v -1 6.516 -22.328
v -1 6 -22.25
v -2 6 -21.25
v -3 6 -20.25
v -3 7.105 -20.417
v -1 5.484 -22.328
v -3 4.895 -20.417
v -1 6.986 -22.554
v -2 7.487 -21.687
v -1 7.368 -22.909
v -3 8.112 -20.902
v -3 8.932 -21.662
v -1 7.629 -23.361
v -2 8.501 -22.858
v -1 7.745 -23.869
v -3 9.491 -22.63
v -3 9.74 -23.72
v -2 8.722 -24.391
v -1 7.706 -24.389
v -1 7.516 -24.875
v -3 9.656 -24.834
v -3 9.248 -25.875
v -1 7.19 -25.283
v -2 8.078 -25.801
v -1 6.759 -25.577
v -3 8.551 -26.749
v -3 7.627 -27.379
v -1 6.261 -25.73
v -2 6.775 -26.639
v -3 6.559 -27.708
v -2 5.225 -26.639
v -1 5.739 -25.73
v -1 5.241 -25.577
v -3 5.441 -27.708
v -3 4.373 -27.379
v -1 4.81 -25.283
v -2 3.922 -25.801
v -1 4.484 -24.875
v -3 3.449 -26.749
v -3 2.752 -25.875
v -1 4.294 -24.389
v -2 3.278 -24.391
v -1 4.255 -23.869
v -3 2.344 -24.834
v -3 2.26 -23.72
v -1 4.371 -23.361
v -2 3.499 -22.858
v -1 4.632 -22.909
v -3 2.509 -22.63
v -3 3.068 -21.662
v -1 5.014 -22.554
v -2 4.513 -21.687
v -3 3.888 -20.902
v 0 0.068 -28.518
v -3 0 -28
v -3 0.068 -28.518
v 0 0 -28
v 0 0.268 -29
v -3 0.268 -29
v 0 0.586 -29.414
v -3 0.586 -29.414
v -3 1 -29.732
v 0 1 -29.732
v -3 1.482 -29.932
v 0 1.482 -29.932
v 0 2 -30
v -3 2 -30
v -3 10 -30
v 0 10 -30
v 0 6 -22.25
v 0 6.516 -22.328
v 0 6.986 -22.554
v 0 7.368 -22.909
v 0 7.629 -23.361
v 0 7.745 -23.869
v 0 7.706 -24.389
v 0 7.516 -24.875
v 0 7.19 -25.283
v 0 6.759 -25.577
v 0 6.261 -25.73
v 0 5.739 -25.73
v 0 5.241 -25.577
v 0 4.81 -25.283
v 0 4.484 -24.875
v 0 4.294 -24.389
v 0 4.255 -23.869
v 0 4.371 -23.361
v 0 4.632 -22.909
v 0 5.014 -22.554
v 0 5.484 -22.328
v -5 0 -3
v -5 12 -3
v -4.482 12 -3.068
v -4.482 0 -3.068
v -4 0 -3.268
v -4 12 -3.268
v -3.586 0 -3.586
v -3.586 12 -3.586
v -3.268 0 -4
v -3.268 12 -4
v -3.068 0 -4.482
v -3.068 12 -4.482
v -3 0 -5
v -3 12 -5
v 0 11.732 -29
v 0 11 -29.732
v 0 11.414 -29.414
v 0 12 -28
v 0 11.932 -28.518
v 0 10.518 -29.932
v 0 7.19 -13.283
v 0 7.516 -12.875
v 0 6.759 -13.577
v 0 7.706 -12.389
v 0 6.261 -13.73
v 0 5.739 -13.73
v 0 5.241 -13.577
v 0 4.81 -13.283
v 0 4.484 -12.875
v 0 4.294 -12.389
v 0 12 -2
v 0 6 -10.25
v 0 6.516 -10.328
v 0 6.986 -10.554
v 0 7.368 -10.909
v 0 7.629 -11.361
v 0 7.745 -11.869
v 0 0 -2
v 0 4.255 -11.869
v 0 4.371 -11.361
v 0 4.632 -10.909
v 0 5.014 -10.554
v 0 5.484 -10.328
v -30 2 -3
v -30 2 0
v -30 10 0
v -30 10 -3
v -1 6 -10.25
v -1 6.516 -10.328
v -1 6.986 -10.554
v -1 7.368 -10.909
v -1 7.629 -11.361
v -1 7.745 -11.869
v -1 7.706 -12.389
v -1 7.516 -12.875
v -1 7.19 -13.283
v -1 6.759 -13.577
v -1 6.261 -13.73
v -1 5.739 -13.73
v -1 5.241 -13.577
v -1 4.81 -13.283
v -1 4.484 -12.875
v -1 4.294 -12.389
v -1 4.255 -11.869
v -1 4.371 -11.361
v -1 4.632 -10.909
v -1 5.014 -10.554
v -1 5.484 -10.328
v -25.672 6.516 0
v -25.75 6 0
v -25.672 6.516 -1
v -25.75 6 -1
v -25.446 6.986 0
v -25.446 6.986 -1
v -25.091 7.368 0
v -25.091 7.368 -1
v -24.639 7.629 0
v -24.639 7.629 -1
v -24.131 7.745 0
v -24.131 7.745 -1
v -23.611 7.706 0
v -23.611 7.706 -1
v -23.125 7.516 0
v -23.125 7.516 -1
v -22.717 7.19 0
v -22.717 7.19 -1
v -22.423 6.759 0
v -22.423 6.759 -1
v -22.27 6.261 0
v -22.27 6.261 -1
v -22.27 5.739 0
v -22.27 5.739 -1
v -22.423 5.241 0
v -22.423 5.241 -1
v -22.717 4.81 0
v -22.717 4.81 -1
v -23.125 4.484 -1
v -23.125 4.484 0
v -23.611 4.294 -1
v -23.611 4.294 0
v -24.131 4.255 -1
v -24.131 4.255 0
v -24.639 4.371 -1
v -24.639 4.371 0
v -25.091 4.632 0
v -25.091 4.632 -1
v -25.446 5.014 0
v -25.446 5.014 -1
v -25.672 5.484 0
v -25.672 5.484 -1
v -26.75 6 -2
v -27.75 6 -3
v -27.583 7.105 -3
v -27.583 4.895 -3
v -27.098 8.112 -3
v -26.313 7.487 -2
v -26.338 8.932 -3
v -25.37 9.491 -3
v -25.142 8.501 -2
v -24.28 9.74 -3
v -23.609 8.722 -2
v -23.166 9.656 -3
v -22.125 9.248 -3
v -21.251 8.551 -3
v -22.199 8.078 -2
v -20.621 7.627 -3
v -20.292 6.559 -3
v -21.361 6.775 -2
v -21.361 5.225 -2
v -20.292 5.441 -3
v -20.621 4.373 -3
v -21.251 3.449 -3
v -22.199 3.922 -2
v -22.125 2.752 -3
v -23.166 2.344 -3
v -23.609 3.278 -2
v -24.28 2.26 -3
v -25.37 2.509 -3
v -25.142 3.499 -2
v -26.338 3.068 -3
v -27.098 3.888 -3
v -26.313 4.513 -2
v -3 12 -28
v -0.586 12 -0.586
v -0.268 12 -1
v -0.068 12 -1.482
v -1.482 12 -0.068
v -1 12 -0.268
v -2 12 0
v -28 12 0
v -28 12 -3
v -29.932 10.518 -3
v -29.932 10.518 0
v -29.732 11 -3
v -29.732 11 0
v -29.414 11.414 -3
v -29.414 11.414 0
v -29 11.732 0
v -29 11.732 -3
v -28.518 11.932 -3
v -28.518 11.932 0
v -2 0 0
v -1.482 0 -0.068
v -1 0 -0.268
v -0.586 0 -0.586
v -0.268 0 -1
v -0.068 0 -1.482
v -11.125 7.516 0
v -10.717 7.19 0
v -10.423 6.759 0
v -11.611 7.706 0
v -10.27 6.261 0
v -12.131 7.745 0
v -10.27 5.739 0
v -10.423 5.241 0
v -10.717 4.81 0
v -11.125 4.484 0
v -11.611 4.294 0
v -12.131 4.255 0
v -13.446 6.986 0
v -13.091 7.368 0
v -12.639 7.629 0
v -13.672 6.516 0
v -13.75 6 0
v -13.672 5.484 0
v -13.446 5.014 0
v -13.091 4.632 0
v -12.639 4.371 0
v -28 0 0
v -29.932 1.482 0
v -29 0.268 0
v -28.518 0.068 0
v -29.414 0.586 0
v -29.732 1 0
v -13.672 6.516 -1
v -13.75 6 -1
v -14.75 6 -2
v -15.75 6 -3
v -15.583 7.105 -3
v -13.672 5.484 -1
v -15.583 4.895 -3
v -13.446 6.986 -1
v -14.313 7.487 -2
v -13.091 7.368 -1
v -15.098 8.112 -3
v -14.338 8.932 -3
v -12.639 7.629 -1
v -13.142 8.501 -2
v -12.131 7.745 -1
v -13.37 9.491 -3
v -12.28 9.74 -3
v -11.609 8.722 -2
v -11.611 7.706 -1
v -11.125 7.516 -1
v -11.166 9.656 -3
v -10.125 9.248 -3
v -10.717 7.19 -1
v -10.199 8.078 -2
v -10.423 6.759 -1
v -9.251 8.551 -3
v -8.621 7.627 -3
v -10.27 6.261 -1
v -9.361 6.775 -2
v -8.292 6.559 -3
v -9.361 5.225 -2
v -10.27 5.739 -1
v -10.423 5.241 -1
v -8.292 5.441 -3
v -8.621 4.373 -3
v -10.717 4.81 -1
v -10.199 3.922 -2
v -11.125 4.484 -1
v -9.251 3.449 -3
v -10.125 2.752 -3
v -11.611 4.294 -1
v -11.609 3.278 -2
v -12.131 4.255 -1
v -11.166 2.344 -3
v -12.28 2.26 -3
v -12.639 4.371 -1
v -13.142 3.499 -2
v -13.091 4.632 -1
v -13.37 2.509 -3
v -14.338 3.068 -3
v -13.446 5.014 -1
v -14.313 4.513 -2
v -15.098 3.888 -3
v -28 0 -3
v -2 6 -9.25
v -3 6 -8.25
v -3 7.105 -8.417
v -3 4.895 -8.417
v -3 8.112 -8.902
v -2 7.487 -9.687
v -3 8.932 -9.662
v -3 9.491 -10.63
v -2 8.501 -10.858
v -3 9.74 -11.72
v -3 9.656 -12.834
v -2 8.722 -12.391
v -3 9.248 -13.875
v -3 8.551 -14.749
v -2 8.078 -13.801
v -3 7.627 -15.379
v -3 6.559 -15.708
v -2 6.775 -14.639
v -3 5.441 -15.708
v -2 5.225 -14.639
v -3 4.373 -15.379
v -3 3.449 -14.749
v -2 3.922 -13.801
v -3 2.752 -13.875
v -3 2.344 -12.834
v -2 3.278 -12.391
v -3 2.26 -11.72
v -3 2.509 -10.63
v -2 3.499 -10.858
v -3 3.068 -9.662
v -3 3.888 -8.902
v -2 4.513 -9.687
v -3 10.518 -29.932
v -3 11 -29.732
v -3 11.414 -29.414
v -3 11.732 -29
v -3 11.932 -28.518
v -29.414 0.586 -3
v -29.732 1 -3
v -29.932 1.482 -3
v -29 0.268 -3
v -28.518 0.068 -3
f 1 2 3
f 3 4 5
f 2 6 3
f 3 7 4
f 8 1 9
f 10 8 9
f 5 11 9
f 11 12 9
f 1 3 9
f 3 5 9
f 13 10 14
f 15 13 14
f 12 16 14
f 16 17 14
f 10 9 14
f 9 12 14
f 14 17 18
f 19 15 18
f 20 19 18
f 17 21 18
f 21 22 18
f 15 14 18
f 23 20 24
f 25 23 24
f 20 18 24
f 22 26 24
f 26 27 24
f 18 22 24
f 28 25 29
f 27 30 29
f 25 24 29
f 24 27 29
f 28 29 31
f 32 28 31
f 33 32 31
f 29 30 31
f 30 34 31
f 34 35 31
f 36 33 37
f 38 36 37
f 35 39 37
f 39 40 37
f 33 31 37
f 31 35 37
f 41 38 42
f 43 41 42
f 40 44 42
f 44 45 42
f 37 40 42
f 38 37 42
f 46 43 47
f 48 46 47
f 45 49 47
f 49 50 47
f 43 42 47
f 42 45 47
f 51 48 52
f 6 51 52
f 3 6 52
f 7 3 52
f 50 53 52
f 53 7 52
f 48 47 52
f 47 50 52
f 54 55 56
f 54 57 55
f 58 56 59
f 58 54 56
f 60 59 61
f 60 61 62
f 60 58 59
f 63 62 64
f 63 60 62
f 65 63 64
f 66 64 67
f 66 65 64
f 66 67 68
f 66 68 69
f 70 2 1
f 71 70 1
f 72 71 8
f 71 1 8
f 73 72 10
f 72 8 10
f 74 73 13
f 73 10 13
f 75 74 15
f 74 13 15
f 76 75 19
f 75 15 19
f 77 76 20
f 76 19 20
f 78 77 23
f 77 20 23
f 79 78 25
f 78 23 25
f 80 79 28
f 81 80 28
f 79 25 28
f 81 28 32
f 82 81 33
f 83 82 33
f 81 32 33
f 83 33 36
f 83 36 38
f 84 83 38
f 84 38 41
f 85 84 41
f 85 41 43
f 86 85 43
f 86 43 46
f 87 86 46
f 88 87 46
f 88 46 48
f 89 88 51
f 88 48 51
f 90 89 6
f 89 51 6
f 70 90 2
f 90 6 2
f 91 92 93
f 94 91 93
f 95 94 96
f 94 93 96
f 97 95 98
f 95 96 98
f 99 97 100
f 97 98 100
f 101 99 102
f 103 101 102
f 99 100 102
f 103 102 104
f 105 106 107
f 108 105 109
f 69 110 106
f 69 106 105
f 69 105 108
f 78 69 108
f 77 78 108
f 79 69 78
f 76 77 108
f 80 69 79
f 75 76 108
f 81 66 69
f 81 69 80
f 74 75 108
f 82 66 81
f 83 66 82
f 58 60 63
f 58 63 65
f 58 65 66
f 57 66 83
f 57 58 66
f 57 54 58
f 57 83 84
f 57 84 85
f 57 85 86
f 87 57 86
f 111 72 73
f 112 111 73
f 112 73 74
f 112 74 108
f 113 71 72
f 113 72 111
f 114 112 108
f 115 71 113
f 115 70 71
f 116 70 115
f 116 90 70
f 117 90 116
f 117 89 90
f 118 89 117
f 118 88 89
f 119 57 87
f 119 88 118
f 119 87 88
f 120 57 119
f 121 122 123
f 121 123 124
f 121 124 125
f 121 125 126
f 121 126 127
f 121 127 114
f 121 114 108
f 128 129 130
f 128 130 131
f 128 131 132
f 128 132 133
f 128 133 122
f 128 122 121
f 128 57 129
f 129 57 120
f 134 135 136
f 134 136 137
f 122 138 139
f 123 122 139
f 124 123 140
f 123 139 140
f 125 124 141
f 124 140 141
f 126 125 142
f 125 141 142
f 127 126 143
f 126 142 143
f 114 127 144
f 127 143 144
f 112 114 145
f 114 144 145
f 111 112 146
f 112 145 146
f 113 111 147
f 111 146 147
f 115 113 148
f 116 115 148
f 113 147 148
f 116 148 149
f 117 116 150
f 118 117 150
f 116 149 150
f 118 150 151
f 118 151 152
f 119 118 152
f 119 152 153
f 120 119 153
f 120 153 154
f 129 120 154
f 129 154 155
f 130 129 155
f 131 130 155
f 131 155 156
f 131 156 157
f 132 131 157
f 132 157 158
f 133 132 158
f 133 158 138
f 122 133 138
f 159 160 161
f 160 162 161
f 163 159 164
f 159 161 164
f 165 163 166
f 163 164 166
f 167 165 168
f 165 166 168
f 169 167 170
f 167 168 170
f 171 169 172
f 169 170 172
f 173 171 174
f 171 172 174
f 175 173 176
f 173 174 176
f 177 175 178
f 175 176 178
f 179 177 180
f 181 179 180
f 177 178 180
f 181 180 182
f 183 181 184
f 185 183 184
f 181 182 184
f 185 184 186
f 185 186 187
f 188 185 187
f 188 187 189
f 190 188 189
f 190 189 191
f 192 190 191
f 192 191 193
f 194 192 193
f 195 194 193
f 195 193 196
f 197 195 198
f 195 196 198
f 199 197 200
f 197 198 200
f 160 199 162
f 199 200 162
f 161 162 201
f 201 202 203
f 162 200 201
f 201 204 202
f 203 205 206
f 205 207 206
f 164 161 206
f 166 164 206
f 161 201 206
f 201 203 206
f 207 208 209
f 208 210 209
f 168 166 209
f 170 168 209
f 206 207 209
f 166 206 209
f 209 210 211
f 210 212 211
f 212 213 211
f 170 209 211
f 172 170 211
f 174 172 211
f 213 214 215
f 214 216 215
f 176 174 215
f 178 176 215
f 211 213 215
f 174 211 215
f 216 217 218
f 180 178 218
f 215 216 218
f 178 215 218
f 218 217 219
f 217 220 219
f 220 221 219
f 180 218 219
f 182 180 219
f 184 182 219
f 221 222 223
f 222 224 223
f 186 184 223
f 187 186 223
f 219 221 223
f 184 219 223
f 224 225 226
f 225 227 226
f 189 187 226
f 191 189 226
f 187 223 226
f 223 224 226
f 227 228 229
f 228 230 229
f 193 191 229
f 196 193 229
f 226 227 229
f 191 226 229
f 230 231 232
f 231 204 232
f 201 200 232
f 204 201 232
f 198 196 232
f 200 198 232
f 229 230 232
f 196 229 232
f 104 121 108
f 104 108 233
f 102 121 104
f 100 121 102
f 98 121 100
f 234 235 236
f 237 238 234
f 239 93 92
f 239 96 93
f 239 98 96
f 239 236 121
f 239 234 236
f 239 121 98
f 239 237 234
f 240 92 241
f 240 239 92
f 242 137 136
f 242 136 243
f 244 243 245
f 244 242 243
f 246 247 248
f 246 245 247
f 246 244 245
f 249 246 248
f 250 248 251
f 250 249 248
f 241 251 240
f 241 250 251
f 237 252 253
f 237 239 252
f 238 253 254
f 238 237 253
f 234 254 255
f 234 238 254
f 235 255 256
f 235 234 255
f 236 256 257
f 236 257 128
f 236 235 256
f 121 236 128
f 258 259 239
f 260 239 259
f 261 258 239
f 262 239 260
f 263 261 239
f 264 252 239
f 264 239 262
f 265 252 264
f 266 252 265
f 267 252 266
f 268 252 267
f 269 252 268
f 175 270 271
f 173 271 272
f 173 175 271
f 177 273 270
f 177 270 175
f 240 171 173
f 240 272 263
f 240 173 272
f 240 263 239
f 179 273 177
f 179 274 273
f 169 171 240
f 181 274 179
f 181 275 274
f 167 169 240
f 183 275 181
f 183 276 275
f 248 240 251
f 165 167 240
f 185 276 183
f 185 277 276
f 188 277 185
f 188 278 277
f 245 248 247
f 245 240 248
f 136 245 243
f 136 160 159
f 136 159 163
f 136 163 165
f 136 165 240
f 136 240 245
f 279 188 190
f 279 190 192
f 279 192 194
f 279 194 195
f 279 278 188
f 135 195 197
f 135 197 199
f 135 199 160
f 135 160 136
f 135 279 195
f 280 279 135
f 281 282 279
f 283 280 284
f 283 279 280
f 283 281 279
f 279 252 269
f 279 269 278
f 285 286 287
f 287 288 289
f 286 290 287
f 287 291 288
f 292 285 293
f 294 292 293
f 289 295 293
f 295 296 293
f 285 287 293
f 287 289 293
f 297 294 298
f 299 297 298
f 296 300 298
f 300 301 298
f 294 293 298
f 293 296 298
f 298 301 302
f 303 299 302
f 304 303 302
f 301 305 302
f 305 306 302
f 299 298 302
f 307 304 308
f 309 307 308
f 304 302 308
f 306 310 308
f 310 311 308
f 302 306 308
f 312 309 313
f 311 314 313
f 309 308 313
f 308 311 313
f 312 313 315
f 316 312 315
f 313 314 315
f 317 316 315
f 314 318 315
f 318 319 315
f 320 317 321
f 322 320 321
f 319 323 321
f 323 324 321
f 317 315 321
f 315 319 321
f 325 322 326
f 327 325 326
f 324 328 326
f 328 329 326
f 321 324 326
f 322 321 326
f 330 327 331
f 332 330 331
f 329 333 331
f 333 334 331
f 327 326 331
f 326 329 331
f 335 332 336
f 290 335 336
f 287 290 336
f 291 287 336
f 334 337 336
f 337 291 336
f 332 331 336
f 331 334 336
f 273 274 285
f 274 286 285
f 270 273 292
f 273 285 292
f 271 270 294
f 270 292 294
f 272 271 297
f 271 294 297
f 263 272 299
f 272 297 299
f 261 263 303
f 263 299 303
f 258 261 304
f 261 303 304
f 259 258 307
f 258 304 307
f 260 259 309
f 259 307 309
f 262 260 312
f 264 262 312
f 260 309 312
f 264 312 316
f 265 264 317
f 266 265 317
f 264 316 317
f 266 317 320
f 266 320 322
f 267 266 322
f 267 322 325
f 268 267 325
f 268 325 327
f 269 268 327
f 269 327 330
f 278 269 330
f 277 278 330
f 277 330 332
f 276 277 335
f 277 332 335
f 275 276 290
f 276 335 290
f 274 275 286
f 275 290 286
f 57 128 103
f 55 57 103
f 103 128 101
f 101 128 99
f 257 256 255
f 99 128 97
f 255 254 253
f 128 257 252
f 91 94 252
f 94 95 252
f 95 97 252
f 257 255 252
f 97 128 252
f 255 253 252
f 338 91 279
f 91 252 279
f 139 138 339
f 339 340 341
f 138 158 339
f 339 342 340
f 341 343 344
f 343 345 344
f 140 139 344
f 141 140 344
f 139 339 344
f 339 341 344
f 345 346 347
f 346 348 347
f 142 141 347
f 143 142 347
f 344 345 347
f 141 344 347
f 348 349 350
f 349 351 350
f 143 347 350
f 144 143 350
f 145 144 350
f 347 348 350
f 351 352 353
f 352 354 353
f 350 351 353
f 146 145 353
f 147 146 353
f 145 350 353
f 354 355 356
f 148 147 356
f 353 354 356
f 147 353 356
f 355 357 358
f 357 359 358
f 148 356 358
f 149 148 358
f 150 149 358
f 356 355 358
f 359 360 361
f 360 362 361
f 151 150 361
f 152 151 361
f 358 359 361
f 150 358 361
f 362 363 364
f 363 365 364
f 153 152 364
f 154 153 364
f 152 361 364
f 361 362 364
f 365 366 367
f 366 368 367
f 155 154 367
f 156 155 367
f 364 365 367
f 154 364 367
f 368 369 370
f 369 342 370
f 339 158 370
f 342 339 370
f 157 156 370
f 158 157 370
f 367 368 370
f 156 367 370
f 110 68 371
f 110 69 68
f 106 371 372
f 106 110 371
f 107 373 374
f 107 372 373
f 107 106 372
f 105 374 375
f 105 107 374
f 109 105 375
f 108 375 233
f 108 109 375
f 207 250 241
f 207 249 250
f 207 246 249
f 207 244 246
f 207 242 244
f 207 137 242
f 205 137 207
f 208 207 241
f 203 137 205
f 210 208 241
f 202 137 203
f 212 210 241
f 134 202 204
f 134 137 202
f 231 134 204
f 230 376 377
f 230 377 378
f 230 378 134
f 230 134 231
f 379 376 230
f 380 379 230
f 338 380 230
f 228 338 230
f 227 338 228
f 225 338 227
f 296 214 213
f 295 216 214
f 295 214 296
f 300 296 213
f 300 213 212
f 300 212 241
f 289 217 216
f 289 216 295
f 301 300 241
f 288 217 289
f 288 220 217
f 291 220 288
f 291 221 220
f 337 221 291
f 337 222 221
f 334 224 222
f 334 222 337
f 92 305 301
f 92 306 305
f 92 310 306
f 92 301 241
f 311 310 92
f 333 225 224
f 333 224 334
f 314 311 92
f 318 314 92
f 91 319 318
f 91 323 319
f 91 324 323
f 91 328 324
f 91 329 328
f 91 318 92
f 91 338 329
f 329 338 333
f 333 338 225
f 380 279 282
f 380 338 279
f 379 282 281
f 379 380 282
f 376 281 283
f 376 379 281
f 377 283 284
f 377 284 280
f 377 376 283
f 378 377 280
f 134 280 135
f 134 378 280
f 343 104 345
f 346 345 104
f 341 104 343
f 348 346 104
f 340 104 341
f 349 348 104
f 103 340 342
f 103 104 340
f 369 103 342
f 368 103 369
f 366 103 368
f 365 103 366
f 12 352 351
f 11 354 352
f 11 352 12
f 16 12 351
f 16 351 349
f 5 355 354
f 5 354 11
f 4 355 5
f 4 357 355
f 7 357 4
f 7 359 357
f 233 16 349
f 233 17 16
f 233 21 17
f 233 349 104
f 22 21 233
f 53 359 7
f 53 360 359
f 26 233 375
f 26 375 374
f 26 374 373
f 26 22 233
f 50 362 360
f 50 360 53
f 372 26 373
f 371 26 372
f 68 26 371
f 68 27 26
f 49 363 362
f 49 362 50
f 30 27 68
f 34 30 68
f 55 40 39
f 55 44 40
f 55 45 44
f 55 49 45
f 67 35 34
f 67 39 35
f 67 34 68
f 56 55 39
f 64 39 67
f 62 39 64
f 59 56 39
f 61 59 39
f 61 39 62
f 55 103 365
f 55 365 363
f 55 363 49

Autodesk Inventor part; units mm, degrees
ref_plane "YZ Plane" through (0, 0, 0) normal (1, 0, 0) x (0, 1, 0)
ref_plane "XZ Plane" through (0, 0, 0) normal (0, 1, 0) x (-1, 0, 0)
ref_plane "XY Plane" through (0, 0, 0) normal (0, 0, 1) x (1, 0, 0)
sketch "Sketch1" plane through (0, 0, 0) normal (0, 1, 0) x (-1, 0, 0)
  line L0 (0, 0) -> (30, 0)
  line L1 (30, 0) -> (30, -3)
  line L2 (30, -3) -> (3, -3)
  line L3 (3, -3) -> (3, -30)
  line L4 (3, -30) -> (0, -30)
  line L5 (0, -30) -> (0, 0)
  dimension "d0" = 3
  dimension "d1" = 3
  dimension "d4" = 30
  dimension "d5" = 30
extrude "Extrusion1" add sketch "Sketch1" along normal blind 12
sketch "Sketch2" plane through (-3, 0, -30) normal (-1, 0, 0) x (0, 0, 1)
  line L0 (0, 0) -> (0, 12) projected
  line L1 (0, 6) -> (27, 6) construction
  line L2 (27, 0) -> (27, 12) projected
  circle A0 centre (6, 6) radius 1.75
  circle A1 centre (18, 6) radius 1.75
  point P0 (30, 0)
  dimension "d8" = 3.5
  dimension "d9" = 3.5
  dimension "d10" = 6
  dimension "d11" = 12
extrude "Extrusion2" cut sketch "Sketch2" against normal blind 12
sketch "Sketch3" plane through (-3, 0, -3) normal (0, 0, -1) x (-1, 0, 0)
  line L0 (27, 0) -> (27, 12) projected
  line L1 (27, 6) -> (0, 6) construction
  line L2 (0, 0) -> (0, 12) projected
  circle A0 centre (21, 6) radius 1.75
  circle A1 centre (9, 6) radius 1.75
  point P0 (-3, 0)
  dimension "d14" = 6
  dimension "d15" = 12
  dimension "d16" = 3.5
  dimension "d17" = 3.5
extrude "Extrusion3" cut sketch "Sketch3" against normal blind 12
chamfer "Chamfer1" distance 2 angle 45 4 edges at (-22.25, 6, -3) (-10.25, 6, -3) (-3, 6, -13.75) (-3, 6, -25.75)
fillet "Fillet1" radius 2 6 edges at (-1.5, 12, -30) (-1.5, 0, -30) (-30, 12, -1.5) (-30, 0, -1.5) (-3, 6, -3) (0, 6, 0)
properties part number "Bracket"
